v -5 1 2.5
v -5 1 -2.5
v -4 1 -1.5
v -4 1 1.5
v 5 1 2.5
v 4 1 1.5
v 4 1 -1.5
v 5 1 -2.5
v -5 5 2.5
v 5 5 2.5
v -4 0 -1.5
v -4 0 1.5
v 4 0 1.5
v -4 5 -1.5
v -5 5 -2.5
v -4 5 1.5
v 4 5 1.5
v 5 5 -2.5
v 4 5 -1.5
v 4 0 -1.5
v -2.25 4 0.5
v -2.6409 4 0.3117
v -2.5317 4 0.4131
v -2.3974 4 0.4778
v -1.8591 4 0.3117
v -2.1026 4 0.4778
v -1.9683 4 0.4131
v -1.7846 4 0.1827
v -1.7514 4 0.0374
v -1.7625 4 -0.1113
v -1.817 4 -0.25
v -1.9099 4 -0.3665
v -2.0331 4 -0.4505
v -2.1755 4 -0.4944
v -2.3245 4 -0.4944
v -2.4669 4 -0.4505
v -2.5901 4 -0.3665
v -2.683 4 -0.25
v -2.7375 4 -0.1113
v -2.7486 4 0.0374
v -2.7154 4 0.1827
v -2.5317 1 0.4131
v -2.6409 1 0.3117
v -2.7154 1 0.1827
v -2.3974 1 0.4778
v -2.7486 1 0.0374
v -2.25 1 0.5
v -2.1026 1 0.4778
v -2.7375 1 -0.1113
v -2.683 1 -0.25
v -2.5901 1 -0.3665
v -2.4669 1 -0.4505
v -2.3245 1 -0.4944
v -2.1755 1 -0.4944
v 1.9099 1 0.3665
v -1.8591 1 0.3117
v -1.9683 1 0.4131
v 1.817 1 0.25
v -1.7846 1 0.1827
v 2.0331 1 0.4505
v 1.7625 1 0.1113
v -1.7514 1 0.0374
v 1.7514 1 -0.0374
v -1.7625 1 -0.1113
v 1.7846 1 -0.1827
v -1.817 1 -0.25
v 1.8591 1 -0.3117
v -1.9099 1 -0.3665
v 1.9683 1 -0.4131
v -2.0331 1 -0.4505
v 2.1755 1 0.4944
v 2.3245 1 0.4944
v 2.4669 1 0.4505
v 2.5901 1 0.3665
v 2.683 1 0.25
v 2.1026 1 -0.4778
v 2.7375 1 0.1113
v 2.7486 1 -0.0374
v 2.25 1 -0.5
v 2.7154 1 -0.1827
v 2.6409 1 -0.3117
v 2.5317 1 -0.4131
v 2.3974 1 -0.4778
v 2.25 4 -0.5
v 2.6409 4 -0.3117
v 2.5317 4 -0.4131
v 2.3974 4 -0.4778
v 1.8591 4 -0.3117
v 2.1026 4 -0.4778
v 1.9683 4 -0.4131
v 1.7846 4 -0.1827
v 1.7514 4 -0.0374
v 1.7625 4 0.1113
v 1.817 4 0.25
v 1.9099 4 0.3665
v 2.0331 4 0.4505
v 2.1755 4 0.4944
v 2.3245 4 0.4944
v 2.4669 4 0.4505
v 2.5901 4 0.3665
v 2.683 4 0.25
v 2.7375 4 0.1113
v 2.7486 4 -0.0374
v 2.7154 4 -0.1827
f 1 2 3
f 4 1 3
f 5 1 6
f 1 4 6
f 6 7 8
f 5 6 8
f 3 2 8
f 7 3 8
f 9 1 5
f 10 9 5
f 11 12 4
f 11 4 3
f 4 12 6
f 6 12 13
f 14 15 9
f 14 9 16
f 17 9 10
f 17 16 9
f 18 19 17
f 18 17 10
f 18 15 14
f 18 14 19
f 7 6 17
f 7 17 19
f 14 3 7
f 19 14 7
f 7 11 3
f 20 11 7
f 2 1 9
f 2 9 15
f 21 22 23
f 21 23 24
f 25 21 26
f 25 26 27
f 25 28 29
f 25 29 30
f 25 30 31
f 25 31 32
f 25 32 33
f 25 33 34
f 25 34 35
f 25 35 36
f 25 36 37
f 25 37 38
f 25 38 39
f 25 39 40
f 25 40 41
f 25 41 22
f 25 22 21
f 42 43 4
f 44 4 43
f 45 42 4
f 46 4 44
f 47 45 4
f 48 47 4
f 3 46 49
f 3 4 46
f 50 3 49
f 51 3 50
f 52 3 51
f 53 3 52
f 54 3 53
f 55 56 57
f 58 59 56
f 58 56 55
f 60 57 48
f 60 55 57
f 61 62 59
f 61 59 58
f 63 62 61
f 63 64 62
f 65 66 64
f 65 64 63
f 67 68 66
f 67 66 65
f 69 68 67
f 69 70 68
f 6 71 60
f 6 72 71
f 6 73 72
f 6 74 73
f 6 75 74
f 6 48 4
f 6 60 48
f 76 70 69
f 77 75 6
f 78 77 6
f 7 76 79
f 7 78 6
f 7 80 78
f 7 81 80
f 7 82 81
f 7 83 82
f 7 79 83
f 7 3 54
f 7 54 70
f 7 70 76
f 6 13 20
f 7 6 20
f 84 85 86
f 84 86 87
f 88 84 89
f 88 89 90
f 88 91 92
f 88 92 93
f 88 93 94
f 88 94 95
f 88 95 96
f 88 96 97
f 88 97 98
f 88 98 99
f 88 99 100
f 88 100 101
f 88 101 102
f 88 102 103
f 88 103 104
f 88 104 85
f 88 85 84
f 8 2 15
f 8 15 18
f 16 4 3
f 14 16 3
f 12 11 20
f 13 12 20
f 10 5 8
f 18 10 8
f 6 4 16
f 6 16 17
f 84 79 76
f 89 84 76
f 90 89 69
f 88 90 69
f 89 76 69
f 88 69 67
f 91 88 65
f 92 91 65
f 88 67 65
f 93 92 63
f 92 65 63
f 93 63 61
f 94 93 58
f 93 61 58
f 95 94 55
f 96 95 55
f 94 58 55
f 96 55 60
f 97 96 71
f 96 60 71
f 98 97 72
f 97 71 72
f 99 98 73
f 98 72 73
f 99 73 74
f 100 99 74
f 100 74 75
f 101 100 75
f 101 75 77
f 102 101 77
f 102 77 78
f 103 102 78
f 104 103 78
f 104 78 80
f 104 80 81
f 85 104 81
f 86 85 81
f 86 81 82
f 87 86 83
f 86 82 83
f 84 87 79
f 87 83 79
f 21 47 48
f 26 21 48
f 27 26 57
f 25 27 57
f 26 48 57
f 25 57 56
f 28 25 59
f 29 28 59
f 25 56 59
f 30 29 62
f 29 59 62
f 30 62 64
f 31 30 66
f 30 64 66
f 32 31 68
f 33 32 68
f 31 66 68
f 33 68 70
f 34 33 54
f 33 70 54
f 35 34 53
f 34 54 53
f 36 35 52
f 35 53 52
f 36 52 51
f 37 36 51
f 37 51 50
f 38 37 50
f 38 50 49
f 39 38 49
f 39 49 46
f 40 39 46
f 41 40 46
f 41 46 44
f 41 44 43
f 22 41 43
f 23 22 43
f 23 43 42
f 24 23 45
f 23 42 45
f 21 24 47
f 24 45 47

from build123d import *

# Parameters (mm, degrees)
SKETCH_1_W      = 8
SKETCH_1_H      = 3
EXTRUDE_1_DEPTH = 1
SKETCH_2_R      = 0.5
EXTRUDE_2_DEPTH = 3
SKETCH_3_W      = 10
SKETCH_3_H      = 5
SKETCH_3_W_2    = 8
SKETCH_3_H_2    = 3
EXTRUDE_3_DEPTH = 4


with BuildPart() as part:
    # 草图1 → 凸台-拉伸1 (new body)
    with BuildSketch(Plane(origin=(0, 0, 0), x_dir=(1, 0, 0), z_dir=(0, 1, 0))):
        Rectangle(SKETCH_1_W, SKETCH_1_H)
    extrude(amount=EXTRUDE_1_DEPTH)

    # 草图2 → 凸台-拉伸2 (add)
    with BuildSketch(Plane(origin=(0, 1, 0), x_dir=(1, 0, 0), z_dir=(0, 1, 0))):
        with Locations((-2.25, 0)):
            Circle(SKETCH_2_R)
        with Locations((2.25, 0)):
            Circle(SKETCH_2_R)
    extrude(amount=EXTRUDE_2_DEPTH)


with BuildPart() as body_2:
    # 草图3 → 凸台-拉伸3 (new body)
    with BuildSketch(Plane(origin=(0, 1, 0), x_dir=(1, 0, 0), z_dir=(0, 1, 0))):
        Rectangle(SKETCH_3_W, SKETCH_3_H)
        Rectangle(SKETCH_3_W_2, SKETCH_3_H_2, mode=Mode.SUBTRACT)
    extrude(amount=EXTRUDE_3_DEPTH)


solid = Compound([part.part, body_2.part])
